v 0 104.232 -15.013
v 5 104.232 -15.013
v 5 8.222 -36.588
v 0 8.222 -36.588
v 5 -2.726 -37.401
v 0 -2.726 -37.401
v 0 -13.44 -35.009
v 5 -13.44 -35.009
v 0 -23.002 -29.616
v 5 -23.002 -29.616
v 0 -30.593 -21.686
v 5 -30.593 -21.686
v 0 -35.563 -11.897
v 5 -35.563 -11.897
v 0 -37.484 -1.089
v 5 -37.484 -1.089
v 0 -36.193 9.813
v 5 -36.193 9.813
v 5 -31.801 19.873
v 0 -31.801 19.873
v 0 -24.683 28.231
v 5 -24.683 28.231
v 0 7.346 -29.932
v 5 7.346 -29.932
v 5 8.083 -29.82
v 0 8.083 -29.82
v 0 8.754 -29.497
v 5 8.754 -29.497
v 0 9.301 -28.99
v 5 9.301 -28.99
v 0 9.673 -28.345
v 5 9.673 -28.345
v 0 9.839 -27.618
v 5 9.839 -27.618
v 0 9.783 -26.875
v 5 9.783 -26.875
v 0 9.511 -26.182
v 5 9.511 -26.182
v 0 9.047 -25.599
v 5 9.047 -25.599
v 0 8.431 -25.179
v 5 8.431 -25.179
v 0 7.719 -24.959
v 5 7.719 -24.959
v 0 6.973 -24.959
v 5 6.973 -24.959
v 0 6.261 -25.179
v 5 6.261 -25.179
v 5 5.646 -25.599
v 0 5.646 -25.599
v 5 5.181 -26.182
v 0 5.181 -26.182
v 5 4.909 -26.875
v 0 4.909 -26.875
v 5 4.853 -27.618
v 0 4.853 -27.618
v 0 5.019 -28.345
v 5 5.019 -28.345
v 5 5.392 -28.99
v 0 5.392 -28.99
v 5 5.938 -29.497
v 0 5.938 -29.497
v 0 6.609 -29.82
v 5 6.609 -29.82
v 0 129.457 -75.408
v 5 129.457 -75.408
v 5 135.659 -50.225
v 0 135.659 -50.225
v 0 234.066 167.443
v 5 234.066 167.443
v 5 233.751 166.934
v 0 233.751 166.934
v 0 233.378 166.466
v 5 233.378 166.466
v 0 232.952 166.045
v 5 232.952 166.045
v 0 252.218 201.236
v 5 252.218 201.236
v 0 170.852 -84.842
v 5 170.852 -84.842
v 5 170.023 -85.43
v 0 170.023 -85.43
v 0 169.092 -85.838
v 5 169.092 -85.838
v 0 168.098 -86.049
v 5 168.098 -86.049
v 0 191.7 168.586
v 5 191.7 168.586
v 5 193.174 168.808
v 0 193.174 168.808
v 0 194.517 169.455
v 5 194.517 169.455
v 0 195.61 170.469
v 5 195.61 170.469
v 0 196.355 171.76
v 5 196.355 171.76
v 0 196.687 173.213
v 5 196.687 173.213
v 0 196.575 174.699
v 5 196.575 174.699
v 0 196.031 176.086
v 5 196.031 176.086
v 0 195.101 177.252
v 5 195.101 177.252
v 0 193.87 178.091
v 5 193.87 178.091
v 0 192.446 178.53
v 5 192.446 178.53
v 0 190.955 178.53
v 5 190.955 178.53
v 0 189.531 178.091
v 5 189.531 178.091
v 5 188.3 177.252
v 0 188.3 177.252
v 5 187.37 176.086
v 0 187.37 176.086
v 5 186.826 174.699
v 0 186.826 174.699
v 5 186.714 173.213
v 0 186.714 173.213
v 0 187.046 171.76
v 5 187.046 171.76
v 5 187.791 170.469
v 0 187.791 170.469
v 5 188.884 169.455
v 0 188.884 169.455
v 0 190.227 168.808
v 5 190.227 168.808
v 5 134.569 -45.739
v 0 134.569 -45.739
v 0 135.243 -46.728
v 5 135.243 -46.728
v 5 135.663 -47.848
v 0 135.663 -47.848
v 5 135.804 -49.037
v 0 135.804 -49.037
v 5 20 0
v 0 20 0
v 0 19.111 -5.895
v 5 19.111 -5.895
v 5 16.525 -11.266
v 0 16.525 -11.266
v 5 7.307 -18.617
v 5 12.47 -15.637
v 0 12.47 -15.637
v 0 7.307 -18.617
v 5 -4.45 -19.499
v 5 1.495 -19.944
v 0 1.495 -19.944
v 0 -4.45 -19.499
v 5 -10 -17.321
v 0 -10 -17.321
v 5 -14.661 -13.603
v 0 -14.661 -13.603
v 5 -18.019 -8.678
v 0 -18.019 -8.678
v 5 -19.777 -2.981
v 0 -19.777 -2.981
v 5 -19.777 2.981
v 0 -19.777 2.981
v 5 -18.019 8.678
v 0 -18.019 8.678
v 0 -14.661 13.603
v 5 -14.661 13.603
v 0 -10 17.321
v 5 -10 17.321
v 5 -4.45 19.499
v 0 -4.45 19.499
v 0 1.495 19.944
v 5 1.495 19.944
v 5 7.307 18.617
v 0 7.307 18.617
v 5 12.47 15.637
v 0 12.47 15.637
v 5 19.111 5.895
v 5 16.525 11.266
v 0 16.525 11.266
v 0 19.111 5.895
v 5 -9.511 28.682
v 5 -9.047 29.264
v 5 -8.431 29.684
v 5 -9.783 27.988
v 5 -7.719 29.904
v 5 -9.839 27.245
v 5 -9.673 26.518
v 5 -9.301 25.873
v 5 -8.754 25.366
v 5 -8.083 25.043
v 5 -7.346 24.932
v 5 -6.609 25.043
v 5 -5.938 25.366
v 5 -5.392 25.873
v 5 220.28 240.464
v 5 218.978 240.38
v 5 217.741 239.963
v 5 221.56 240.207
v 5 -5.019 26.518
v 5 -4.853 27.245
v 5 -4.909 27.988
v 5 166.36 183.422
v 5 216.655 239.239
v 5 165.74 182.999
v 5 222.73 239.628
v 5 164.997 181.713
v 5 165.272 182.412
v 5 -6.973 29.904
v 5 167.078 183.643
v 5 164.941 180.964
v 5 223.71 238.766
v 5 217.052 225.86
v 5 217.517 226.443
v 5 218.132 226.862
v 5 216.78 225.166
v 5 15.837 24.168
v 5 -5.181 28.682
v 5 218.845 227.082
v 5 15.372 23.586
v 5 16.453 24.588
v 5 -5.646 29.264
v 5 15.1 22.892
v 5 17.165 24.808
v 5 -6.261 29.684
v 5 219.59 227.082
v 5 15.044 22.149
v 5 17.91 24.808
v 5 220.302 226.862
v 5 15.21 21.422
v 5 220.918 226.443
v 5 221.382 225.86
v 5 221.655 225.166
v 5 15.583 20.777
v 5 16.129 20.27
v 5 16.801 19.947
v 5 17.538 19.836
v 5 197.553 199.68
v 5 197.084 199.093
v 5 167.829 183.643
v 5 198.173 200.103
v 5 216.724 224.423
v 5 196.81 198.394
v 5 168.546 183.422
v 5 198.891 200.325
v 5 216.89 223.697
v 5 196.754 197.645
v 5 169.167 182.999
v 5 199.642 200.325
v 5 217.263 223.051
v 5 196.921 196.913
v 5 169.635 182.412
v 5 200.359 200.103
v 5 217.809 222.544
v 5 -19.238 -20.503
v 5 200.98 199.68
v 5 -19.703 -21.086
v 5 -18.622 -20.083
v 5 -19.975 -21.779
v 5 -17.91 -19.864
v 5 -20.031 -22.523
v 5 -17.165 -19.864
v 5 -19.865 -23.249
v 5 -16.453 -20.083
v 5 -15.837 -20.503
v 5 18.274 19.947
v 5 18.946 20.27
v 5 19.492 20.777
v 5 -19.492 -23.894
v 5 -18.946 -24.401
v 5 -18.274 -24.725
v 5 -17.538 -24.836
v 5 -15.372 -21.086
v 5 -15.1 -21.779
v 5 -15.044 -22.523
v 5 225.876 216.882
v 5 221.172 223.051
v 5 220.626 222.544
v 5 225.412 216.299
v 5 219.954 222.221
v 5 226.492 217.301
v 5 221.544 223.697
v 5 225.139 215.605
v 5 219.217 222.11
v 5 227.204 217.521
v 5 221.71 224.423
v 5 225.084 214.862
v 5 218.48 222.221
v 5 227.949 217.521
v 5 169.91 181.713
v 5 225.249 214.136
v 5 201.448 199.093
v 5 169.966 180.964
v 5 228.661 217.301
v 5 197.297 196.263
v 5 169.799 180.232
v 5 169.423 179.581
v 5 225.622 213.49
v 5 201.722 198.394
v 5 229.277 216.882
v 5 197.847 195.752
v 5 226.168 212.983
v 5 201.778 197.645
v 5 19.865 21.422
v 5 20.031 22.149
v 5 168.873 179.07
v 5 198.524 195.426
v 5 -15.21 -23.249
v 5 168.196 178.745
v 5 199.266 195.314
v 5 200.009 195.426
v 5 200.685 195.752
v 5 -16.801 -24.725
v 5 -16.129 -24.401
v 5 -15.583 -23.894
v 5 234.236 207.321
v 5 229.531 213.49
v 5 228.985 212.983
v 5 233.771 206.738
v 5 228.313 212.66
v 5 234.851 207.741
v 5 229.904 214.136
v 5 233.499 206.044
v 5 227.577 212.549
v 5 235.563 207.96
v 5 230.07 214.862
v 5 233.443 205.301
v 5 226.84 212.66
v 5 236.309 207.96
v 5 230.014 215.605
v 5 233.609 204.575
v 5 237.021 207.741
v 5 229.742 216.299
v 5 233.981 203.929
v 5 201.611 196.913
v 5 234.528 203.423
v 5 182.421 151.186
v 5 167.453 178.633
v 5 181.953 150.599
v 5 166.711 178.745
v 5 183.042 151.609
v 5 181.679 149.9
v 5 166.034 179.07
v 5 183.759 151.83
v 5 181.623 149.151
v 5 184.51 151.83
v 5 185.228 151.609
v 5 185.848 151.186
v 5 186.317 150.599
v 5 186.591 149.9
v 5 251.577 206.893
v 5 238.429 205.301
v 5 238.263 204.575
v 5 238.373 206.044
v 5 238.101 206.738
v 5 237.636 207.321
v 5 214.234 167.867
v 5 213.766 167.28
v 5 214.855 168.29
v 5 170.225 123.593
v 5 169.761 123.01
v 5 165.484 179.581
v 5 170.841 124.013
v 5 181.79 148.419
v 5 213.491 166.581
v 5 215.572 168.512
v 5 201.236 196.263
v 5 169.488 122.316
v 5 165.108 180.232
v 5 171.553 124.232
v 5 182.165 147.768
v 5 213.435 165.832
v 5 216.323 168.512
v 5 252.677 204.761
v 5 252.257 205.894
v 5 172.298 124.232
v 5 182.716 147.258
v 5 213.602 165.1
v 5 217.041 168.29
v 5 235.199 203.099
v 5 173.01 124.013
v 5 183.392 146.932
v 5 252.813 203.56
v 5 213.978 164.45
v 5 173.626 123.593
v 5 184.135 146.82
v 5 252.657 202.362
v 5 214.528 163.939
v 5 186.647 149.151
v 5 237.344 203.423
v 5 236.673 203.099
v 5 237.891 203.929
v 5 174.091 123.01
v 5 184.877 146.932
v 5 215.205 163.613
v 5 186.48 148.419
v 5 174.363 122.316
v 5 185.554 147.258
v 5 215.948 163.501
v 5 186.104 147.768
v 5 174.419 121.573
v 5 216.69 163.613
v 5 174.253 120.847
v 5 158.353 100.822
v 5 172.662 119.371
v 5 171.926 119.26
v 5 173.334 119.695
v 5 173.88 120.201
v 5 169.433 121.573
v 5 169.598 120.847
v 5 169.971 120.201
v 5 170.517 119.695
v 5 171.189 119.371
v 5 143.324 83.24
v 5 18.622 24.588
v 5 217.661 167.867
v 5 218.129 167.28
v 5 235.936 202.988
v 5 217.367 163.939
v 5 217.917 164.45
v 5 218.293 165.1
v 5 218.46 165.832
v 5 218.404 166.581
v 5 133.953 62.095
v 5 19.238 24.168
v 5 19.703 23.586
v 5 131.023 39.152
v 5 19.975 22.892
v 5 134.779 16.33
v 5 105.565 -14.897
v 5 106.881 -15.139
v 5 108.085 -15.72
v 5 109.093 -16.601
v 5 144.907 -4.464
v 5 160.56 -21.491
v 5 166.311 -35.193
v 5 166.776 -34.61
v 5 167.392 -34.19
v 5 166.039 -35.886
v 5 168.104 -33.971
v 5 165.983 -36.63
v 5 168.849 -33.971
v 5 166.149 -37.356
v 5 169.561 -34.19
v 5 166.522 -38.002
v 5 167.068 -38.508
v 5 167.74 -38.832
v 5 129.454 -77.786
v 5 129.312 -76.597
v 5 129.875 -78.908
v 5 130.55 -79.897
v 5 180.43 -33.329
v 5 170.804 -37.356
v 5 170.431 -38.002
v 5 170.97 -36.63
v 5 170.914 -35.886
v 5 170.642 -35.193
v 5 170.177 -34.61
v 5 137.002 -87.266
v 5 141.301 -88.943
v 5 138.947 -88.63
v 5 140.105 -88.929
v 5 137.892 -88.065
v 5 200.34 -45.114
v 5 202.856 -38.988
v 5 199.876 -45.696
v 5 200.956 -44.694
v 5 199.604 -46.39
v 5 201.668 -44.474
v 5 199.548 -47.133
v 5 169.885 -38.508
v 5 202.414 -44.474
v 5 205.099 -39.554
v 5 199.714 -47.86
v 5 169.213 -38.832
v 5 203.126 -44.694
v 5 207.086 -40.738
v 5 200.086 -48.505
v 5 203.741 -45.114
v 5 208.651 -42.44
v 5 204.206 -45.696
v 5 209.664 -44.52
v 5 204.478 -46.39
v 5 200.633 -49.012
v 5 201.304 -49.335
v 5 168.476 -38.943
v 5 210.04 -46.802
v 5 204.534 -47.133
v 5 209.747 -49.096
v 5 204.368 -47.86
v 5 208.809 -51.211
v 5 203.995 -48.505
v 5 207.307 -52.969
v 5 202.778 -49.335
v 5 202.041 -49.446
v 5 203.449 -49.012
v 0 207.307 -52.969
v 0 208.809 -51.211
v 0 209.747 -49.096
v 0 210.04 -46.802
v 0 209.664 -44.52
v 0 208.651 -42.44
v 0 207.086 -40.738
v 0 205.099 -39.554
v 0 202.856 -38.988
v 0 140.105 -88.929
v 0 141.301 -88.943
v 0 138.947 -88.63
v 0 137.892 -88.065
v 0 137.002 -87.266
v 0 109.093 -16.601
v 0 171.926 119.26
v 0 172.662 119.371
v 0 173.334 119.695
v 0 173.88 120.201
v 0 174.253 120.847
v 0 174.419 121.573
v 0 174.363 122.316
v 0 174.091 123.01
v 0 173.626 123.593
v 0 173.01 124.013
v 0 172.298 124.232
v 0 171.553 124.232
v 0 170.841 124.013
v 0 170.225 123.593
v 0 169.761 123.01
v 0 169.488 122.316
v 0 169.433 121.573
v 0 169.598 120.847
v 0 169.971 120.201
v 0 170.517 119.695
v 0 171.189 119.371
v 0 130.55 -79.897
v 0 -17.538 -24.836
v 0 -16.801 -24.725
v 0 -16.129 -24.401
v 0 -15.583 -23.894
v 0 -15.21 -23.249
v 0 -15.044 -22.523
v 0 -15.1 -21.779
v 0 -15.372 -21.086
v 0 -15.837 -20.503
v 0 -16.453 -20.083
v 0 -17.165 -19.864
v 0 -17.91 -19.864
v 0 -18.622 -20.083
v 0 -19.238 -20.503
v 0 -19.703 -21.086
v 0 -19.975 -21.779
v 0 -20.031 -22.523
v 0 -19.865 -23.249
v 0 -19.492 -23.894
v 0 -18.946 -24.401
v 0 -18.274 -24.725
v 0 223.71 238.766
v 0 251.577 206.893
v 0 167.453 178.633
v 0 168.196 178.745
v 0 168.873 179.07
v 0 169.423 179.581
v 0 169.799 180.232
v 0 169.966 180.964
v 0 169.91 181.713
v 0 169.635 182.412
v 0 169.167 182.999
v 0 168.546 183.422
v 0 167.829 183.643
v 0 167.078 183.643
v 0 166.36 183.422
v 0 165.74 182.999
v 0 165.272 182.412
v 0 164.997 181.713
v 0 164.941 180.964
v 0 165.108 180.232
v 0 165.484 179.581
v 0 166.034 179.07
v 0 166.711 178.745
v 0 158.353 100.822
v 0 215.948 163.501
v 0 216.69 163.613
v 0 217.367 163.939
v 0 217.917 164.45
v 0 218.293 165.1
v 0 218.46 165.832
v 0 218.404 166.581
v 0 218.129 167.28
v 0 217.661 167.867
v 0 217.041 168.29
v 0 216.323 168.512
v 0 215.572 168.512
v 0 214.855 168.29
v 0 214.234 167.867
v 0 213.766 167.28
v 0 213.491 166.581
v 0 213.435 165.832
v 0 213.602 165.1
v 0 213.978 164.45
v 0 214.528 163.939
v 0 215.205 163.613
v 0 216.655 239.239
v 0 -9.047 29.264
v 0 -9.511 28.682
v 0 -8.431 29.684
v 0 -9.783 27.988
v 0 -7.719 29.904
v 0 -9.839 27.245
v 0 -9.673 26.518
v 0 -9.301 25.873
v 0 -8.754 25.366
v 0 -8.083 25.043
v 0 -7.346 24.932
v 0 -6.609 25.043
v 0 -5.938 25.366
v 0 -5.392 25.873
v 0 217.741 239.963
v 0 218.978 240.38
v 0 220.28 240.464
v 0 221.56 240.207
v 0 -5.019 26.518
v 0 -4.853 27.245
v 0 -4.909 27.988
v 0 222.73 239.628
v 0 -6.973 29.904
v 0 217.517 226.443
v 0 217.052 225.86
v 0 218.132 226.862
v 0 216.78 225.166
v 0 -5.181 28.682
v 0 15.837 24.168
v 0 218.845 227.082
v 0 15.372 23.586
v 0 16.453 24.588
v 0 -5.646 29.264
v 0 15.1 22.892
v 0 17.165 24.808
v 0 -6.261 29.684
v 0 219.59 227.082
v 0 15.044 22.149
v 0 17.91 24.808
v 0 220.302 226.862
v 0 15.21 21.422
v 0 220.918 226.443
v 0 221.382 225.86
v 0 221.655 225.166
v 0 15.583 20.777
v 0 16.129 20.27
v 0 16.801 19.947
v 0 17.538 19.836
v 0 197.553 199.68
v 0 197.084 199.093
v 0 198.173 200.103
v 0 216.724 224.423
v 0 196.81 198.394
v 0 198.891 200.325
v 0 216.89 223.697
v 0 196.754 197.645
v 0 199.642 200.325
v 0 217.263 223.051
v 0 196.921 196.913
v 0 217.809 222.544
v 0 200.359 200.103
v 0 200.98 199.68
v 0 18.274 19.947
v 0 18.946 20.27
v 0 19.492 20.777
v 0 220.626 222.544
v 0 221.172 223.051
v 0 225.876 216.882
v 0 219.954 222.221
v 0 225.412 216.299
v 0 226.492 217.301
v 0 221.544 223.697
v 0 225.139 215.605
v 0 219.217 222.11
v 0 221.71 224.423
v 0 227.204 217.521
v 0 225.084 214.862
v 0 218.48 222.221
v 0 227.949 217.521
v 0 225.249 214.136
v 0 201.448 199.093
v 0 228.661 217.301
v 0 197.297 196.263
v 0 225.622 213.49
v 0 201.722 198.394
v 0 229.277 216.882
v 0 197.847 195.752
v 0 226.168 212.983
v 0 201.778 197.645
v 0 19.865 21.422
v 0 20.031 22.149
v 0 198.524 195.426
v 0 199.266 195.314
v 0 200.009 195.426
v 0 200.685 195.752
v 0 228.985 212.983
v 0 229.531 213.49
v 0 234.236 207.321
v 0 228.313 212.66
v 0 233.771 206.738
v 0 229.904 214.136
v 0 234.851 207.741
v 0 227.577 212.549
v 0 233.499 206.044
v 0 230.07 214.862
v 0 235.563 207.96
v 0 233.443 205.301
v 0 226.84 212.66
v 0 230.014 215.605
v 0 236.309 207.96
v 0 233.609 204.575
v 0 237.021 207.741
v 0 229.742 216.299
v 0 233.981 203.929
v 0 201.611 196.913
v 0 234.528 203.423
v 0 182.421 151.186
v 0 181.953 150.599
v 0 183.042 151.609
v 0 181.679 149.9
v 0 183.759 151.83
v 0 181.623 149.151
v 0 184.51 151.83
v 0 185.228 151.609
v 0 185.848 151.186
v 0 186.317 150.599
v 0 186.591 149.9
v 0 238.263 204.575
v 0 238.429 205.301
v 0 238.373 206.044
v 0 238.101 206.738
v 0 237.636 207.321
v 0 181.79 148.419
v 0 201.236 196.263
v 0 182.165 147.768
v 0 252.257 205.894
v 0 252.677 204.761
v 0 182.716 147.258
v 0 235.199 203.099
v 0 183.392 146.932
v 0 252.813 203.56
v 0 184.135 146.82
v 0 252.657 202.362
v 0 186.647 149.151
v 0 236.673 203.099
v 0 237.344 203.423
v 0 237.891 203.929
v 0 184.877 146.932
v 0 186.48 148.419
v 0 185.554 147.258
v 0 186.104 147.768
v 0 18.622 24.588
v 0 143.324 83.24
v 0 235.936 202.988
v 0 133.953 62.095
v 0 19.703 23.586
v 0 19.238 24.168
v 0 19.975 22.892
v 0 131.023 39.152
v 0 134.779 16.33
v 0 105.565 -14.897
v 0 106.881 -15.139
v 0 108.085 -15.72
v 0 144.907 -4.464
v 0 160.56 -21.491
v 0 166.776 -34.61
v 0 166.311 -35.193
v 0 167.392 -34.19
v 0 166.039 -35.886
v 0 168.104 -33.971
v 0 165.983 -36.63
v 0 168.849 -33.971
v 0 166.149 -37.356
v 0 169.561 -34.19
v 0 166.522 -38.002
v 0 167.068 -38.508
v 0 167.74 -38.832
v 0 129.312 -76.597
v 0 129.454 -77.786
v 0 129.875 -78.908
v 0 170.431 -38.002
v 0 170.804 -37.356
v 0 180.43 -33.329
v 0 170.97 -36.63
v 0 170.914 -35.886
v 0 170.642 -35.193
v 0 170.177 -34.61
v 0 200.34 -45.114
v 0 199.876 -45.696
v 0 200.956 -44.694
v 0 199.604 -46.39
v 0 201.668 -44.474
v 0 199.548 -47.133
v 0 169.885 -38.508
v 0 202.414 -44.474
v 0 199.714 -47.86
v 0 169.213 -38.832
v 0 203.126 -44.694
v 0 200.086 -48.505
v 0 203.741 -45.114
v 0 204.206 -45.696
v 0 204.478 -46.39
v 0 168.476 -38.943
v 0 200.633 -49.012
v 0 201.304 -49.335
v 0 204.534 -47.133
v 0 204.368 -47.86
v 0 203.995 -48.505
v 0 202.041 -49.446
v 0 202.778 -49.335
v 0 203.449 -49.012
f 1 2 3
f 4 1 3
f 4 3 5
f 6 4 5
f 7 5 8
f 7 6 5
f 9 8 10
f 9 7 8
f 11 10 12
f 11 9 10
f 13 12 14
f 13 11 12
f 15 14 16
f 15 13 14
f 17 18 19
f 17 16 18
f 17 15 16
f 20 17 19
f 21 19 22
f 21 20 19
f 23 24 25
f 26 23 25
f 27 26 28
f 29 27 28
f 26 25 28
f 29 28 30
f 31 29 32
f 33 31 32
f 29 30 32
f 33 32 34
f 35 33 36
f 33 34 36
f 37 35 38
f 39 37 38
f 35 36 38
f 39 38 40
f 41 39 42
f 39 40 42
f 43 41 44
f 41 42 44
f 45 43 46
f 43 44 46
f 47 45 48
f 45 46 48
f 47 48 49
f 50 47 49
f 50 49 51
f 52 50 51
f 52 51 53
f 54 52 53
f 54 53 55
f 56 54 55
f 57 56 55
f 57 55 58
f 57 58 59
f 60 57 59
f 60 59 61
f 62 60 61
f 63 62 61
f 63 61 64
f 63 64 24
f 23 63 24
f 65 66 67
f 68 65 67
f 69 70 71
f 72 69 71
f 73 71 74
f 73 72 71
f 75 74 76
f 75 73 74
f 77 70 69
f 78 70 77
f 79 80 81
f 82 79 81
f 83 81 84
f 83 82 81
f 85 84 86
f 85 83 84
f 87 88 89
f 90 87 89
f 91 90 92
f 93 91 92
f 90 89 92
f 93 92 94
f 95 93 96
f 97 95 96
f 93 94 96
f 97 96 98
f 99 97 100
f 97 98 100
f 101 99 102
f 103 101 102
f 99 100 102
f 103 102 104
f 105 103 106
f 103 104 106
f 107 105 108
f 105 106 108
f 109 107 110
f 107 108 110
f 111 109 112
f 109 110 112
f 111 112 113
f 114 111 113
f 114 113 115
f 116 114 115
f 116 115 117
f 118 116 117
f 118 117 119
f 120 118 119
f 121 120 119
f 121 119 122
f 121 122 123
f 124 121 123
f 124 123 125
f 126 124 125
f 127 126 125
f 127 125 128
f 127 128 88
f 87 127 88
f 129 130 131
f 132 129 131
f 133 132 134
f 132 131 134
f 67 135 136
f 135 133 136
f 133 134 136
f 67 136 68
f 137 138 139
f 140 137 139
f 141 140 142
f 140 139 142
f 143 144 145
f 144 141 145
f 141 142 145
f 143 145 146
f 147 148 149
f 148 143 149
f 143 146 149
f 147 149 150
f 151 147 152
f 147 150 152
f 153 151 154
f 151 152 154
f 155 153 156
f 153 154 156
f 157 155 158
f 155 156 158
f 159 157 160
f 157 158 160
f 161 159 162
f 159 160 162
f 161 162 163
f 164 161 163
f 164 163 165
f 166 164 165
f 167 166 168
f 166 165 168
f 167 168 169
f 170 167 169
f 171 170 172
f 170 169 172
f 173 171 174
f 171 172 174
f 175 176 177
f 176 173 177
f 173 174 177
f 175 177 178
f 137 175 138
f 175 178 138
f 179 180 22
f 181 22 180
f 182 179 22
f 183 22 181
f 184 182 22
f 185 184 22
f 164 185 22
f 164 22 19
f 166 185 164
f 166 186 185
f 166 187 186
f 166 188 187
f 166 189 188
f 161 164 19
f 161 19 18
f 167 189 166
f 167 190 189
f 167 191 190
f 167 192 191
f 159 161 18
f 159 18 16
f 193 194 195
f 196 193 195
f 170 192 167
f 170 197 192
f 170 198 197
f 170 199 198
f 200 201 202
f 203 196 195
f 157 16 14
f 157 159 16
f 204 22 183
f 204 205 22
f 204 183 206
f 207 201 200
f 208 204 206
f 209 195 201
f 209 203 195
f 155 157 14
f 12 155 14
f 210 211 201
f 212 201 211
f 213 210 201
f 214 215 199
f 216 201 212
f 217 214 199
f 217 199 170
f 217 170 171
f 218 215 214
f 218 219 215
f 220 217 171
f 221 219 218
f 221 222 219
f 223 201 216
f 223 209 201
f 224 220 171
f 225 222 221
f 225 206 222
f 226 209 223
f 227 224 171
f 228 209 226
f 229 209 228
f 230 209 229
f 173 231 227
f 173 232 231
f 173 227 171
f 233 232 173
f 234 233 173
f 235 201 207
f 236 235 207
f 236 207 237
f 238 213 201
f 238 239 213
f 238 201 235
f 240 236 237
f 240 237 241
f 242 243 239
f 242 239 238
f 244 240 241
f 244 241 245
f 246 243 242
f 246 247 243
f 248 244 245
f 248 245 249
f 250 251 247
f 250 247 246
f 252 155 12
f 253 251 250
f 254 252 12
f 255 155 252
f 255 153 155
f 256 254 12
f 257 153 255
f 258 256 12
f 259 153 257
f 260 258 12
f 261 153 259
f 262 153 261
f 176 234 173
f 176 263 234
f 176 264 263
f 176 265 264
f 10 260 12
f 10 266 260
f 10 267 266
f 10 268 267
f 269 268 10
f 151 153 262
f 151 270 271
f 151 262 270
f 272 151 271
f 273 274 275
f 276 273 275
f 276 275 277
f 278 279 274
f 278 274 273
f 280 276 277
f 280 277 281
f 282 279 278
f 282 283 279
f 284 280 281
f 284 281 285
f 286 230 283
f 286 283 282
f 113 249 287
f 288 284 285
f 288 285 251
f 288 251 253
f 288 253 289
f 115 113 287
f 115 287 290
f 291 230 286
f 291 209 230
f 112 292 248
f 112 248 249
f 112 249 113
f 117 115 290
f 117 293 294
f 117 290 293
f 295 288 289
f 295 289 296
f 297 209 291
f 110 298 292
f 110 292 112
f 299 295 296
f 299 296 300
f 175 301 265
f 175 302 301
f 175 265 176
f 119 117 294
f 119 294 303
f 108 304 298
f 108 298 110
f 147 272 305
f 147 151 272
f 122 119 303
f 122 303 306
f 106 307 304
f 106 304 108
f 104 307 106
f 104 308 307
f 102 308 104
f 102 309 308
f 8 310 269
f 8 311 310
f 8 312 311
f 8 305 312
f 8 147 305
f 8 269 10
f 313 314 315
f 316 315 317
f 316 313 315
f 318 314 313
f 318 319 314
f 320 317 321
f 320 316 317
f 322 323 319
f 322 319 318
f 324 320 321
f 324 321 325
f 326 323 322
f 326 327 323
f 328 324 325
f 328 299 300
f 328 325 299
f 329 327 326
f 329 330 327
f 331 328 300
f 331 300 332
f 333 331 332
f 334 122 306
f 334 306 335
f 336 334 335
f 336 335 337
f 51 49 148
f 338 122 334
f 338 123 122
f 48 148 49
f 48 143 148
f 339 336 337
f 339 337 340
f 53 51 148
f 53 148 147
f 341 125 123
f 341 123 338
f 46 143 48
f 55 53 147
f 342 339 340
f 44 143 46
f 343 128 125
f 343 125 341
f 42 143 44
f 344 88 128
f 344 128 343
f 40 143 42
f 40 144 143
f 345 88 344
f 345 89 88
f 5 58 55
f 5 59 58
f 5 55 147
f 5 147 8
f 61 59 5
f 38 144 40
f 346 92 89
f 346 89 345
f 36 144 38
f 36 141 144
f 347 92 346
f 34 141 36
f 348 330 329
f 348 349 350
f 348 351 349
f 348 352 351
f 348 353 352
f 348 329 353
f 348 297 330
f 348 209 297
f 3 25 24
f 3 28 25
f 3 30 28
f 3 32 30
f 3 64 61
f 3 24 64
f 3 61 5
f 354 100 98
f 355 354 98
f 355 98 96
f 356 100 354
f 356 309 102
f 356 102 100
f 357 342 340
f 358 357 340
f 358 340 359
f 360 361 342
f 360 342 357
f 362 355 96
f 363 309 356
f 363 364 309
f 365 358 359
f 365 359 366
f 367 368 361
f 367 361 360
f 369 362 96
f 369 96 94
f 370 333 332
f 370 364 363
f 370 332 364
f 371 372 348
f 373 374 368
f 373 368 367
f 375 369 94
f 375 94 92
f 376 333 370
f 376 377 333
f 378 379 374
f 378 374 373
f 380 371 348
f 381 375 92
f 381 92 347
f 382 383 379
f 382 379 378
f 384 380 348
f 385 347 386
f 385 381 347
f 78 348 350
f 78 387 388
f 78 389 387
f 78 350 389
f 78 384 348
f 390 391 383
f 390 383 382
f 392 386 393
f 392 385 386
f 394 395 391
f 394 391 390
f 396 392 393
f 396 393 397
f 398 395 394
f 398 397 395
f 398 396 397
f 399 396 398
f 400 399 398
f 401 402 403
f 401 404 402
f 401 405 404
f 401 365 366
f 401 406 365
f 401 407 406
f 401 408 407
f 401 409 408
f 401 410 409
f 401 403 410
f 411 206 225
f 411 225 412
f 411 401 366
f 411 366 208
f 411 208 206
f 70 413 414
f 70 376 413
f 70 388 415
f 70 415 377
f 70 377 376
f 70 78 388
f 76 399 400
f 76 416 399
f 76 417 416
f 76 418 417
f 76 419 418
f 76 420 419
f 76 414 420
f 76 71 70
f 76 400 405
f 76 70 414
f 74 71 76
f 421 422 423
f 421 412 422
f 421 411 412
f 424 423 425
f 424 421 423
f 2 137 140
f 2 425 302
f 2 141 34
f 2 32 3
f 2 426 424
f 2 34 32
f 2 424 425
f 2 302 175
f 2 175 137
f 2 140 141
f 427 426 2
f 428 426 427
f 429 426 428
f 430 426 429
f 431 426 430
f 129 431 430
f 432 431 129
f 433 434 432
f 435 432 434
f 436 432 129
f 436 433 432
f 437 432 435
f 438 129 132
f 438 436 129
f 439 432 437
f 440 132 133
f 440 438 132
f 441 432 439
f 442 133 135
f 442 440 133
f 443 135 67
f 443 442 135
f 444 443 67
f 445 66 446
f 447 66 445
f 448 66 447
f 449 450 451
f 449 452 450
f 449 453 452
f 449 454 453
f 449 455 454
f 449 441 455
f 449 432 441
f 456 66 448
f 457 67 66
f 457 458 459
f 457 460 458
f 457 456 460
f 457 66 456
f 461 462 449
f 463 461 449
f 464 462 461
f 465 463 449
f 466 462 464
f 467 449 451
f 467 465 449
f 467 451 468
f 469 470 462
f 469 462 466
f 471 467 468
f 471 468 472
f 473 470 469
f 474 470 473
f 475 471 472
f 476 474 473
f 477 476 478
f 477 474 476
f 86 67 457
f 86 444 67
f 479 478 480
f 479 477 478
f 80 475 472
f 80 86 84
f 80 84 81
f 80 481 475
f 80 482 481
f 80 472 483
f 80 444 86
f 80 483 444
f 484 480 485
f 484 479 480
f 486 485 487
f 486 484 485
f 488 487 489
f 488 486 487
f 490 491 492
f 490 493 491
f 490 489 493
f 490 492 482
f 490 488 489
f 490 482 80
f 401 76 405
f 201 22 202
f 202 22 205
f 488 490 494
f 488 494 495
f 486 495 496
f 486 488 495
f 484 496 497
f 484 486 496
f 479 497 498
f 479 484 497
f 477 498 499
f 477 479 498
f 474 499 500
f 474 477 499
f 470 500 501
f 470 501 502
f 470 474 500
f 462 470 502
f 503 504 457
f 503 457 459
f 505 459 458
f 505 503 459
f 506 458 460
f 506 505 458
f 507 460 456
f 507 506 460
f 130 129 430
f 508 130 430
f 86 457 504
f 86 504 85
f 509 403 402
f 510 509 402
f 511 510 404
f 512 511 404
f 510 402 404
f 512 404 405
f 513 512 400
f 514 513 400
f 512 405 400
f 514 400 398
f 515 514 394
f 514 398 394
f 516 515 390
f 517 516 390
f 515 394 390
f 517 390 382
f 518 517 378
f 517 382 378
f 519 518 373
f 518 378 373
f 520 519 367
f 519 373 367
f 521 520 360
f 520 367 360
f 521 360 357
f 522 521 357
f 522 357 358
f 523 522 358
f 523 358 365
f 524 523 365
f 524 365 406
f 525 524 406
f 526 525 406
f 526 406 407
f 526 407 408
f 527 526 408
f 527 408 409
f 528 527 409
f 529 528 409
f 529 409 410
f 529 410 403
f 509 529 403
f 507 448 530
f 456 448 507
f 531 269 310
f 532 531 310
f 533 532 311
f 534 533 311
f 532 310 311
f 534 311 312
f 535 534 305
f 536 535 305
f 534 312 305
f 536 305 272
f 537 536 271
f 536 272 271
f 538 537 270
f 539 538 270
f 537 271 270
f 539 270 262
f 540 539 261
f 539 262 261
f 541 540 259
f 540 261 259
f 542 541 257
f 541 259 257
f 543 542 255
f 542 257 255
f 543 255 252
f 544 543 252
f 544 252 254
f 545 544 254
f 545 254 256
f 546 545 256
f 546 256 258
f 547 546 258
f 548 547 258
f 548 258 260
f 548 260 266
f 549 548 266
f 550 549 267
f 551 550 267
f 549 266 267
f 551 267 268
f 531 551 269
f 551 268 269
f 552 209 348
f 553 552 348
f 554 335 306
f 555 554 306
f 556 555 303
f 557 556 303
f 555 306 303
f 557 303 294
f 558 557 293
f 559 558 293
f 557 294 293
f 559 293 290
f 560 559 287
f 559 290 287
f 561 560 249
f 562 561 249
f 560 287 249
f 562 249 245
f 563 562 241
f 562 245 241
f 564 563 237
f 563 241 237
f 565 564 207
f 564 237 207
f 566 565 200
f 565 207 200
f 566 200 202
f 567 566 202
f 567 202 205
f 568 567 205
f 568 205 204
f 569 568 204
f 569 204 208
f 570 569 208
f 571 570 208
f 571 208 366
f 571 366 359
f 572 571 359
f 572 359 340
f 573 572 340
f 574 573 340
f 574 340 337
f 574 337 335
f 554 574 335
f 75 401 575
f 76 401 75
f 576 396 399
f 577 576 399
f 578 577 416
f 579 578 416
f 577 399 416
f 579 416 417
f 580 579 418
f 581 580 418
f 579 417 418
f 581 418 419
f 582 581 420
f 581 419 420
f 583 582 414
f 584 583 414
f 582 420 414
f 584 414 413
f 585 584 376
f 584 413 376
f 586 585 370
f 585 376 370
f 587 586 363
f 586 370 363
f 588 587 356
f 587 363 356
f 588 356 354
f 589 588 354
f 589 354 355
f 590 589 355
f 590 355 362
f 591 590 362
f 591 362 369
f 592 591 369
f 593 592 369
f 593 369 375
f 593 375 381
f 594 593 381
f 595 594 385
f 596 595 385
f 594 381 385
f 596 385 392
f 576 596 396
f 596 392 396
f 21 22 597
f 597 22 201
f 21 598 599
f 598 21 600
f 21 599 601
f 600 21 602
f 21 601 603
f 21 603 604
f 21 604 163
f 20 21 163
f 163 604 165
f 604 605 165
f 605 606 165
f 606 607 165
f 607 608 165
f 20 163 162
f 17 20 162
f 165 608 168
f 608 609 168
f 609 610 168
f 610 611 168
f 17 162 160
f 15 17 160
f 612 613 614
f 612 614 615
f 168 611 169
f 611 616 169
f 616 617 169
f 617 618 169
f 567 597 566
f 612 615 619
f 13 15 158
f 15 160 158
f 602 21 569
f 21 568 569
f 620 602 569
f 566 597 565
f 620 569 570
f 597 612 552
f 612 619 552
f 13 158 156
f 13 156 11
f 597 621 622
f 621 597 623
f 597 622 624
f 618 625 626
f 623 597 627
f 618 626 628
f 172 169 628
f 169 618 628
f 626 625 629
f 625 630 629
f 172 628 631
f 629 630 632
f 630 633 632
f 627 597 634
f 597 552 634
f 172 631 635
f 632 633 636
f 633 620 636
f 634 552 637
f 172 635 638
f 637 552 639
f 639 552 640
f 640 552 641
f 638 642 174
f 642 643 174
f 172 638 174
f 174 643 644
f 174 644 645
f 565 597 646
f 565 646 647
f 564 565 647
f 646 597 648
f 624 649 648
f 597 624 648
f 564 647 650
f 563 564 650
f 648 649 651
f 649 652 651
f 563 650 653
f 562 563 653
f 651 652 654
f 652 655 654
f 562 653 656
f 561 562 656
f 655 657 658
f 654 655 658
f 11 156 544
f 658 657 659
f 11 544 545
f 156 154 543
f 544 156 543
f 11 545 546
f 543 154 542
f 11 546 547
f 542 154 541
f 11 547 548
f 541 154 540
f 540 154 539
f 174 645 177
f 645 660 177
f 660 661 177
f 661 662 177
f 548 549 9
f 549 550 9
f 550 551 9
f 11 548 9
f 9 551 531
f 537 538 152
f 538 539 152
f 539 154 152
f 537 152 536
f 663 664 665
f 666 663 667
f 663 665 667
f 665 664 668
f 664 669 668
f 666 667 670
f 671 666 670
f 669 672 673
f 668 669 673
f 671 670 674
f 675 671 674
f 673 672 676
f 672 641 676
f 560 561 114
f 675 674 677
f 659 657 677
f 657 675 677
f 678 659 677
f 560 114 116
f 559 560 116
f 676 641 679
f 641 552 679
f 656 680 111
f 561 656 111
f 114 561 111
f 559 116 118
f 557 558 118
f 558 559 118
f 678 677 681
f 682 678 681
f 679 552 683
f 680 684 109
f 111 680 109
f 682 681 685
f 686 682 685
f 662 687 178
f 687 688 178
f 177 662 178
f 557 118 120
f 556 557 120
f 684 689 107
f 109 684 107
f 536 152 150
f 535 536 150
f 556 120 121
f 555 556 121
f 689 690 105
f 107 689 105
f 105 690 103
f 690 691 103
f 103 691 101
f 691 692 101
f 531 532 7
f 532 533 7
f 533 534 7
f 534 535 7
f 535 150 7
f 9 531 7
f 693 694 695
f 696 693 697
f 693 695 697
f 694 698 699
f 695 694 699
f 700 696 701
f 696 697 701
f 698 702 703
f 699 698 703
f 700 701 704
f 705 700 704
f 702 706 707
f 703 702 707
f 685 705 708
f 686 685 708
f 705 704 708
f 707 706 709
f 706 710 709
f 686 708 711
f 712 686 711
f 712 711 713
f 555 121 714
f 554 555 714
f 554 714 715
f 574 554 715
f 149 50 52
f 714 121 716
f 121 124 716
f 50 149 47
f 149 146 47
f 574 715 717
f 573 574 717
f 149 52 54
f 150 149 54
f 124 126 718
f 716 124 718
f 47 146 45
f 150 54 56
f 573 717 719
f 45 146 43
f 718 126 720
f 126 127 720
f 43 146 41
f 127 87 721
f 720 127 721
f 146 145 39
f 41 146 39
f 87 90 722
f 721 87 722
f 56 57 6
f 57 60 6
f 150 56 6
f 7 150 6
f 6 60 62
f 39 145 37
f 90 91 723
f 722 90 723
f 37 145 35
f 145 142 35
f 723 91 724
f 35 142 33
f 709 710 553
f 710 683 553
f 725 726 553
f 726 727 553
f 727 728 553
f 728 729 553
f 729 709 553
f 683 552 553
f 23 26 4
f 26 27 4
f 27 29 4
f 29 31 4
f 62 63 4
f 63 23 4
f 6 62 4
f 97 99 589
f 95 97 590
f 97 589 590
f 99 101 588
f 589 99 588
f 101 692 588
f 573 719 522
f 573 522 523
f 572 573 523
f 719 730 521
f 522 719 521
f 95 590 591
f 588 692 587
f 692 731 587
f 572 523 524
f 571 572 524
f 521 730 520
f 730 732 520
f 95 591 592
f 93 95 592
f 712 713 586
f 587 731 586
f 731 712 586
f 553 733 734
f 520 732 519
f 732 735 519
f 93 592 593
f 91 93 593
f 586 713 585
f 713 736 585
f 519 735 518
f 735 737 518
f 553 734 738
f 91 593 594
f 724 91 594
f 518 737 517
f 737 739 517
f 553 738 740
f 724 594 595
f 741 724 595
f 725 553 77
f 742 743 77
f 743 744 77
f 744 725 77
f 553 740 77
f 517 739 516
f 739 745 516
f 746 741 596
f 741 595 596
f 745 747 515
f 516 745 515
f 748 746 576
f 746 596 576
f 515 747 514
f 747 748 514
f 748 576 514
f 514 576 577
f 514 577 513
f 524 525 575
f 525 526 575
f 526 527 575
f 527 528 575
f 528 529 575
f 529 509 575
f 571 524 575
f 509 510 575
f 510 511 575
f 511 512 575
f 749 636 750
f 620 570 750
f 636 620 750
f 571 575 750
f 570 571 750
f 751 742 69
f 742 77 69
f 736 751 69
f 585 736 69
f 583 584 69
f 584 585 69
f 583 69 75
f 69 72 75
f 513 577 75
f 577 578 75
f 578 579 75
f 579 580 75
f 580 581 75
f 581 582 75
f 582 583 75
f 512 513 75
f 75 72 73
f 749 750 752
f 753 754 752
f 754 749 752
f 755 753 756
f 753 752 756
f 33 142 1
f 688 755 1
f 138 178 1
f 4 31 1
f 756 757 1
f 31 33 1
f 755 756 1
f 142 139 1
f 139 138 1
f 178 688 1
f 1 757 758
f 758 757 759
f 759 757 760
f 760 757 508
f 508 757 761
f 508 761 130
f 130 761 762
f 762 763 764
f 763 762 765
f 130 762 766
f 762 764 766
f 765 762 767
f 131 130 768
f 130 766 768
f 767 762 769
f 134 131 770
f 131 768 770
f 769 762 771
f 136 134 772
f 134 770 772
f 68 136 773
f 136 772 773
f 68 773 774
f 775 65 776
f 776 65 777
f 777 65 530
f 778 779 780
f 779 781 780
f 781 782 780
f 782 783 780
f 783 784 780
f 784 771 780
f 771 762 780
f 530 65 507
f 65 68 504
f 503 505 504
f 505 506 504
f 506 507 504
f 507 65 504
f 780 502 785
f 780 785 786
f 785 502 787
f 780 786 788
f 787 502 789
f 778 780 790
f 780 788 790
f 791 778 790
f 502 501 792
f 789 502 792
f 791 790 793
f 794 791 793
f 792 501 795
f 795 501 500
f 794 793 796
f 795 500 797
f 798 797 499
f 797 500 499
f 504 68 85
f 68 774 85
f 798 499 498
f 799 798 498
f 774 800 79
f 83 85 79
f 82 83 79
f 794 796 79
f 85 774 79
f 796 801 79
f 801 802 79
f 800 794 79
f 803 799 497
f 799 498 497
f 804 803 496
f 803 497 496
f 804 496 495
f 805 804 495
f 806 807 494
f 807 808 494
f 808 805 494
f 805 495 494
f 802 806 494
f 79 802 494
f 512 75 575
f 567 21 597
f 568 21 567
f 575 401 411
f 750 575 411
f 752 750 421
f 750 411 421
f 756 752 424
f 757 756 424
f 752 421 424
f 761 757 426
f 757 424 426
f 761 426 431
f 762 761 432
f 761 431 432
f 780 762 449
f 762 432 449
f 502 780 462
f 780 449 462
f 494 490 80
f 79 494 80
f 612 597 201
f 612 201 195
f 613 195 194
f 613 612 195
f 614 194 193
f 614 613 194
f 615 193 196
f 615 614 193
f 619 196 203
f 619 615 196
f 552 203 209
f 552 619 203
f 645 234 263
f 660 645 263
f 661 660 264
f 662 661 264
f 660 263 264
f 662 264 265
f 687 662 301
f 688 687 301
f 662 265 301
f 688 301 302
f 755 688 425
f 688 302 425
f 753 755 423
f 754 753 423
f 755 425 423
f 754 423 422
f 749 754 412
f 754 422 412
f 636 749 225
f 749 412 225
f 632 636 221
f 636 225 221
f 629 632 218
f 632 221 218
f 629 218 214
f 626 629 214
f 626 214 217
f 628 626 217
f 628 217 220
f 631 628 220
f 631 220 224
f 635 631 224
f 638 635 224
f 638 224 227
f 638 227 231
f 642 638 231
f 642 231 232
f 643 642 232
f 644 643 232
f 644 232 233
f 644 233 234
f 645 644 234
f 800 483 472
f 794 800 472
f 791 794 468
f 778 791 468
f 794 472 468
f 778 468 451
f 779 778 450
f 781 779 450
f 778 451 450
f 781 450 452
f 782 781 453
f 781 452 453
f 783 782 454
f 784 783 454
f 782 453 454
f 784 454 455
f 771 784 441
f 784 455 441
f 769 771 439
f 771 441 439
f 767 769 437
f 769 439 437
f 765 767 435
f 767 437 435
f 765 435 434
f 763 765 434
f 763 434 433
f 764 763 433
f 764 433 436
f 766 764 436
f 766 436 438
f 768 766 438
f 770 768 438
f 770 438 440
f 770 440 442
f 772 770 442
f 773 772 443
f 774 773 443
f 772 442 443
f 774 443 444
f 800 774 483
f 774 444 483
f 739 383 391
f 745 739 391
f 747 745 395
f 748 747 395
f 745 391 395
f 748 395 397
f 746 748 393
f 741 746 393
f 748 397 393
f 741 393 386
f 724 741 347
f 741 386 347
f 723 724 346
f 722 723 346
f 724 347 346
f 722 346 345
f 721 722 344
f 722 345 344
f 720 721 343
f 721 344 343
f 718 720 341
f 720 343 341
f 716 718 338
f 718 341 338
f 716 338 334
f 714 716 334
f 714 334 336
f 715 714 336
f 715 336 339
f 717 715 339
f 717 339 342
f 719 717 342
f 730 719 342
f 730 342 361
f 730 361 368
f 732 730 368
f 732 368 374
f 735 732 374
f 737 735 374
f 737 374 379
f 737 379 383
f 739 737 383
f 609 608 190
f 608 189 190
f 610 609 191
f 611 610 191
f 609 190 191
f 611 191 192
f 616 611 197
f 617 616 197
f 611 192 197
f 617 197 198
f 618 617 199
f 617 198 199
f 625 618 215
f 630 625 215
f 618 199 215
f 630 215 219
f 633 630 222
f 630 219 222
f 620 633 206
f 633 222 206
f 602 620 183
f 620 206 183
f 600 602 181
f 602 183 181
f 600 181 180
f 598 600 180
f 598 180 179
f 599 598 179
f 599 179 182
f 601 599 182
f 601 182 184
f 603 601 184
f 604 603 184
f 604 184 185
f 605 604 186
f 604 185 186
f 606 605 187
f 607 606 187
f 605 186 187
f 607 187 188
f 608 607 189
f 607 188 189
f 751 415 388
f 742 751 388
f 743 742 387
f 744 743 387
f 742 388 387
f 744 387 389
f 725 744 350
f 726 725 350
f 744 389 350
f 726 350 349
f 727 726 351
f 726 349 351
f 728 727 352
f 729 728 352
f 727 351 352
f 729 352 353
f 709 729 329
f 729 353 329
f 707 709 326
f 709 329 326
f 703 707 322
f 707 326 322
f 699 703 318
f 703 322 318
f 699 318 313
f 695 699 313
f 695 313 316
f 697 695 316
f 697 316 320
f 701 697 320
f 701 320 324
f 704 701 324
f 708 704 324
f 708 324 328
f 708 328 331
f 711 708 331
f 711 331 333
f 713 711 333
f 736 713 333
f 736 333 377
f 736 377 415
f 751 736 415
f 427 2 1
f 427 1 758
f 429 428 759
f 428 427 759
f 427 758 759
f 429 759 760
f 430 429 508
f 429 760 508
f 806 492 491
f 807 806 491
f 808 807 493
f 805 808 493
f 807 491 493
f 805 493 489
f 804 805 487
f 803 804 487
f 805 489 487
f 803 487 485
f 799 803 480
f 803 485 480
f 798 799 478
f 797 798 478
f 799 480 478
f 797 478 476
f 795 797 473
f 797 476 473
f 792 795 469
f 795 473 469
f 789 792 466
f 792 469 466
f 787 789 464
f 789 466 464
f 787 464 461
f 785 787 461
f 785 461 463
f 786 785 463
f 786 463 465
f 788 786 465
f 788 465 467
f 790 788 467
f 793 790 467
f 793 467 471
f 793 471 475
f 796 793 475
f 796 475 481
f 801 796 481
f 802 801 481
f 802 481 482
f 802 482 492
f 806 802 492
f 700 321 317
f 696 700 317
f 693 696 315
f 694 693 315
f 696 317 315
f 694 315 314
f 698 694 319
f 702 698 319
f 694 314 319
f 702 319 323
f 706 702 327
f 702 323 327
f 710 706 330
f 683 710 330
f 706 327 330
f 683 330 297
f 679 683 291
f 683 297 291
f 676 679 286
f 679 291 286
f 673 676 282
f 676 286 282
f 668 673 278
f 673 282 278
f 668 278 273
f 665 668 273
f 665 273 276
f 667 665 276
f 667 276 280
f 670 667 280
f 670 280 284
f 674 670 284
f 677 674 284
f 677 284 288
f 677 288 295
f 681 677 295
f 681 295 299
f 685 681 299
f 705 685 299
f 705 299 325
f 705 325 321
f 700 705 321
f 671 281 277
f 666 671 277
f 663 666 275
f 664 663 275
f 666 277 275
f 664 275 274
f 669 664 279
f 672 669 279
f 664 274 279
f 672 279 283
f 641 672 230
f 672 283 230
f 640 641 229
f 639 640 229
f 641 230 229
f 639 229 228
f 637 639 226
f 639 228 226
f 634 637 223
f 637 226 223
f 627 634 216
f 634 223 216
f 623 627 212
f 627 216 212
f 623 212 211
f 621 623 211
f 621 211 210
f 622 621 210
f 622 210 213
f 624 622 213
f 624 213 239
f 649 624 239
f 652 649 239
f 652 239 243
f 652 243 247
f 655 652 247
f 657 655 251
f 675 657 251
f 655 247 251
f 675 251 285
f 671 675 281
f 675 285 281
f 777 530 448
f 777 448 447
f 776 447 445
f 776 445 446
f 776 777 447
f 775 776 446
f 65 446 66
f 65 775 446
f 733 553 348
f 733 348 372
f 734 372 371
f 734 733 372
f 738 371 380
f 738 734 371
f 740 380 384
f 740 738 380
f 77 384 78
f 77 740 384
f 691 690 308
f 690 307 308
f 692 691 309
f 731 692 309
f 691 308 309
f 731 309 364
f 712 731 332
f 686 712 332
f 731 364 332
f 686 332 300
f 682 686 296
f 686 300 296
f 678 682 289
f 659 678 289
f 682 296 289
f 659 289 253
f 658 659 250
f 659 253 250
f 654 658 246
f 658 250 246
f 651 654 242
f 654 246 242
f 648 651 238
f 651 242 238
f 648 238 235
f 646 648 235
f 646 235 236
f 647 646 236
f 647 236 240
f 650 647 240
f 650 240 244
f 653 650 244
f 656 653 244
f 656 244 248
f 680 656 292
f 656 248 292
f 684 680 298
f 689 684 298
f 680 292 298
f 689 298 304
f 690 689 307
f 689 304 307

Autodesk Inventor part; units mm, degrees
ref_plane "YZ Plane" through (0, 0, 0) normal (1, 0, 0) x (0, 1, 0)
ref_plane "XZ Plane" through (0, 0, 0) normal (0, 1, 0) x (-1, 0, 0)
ref_plane "XY Plane" through (0, 0, 0) normal (0, 0, 1) x (1, 0, 0)
sketch "Esboço1" plane through (0, 0, 0) normal (1, 0, 0) x (0, 1, 0)
  circle A0 centre (0, 0) radius 20
  circle A1 centre (0, 0) radius 37.5
  dimension "d0" = 40
  dimension "d1" = 75
extrude "Extrusão1" add sketch "Esboço1" along normal blind 5
sketch "Esboço3" plane through (5, 0, 0) normal (1, 0, 0) x (0, 0, -1)
  line L0 (154.1962, 109.7603) -> (153.014, 111.1125) projected
  line L1 (40.5387, 95.9825) -> (78.7824, 129.4199) projected
  line L2 (153.014, 111.1125) -> (-99.3237, 399.7205)
  circle A0 centre (0, 0) radius 37.5 projected
  line L3 (-28.231, -24.6832) -> (-242.5302, 220.4188)
  arc A1 (-100.8216, 158.3529) -> (38.988, 202.8563) centre (-40.5953, 211.0103) ccw
  line L4 (-100.8216, 158.3529) -> (-166.6433, 233.6357)
  line L5 (-166.6433, 233.6357) -> (-204.2865, 253.8562)
  circle A2 centre (46.9464, 202.0409) radius 2.5
  circle A3 centre (36.4428, 168.4765) radius 2.5
  arc A4 (52.969, 207.3066) -> (38.988, 202.8563) centre (46.9464, 202.0409) ccw
  line L6 (52.969, 207.3066) -> (85.8799, 169.6652)
  line L7 (85.8799, 169.6652) -> (14.3612, 107.1346)
  line L8 (14.3612, 107.1346) -> (36.5877, 8.2215)
  circle A5 centre (-224.6099, 219.2172) radius 2.5
  circle A6 centre (-205.4881, 235.936) radius 2.5
  circle A7 centre (-215.049, 227.5766) radius 2.5
  line L9 (-242.5302, 220.4188) -> (-204.2865, 253.8562)
  dimension "d5" = 160
  dimension "d10" = 100
  dimension "d11" = 5
  dimension "d12" = 5
  dimension "d13" = 88
  dimension "d14" = 88
  dimension "d15" = 20
  dimension "d16" = 50
  dimension "d18" = 50
  dimension "d19" = 95
  dimension "d20" = 5
  dimension "d21" = 5
  dimension "d22" = 5
  dimension "d23" = 12.7
  dimension "d25" = 12.7
  dimension "d30" = 280
  dimension "d31" = 140
  dimension "d32" = 12.7
  dimension "d33" = 12.7
  dimension "d34" = 12.7
  dimension "d35" = 12.7
extrude "Extrusão2" add sketch "Esboço3" against normal blind 5 contours A0 L3 L9 L5 L4 A1 A4 L6 L7 L8
sketch "Esboço4" plane through (5, 0, 0) normal (1, 0, 0) x (0, 0, -1)
  line L0 (154.1962, 109.7603) -> (153.014, 111.1125) projected
  line L1 (153.014, 111.1125) -> (-112.9577, 415.3142)
  circle A0 centre (-34.8401, 212.0241) radius 75
  circle A1 centre (-121.7601, 171.9256) radius 20
  line L2 (-204.2865, 253.8562) -> (-242.5302, 220.4188) projected
  line L3 (-242.5302, 220.4188) -> (-28.231, -24.6832) projected
  circle A2 centre (-121.7601, 171.9256) radius 2.5
  circle A3 centre (-173.5863, 191.7005) radius 5
  circle A4 centre (-22.3357, 17.5375) radius 2.5 projected
  circle A5 centre (-27.4315, -7.3461) radius 2.5 projected
  circle A6 centre (22.3357, -17.5375) radius 2.5 projected
  circle A7 centre (27.4315, 7.3461) radius 2.5 projected
  point P0 (0, 0)
  dimension "d38" = 150
  dimension "d39" = 40
  dimension "d40" = 116
  dimension "d41" = 59
  dimension "d42" = 5
  dimension "d43" = 10
  dimension "d45" = 33
  dimension "d46" = 67
extrude "Extrusão3" cut sketch "Esboço4" against normal blind 5 contours A2 | A3 | A4 | A5 | A6 | A7
sketch "Esboço5" plane through (5, 0, 0) normal (1, 0, 0) x (0, 0, -1)
  circle A0 centre (-166.0206, 215.9476) radius 2.5193 construction
  circle A1 centre (-197.8334, 199.2662) radius 2.5193
  circle A2 centre (-149.3392, 184.1348) radius 2.5193
  circle A3 centre (-166.0206, 215.9476) radius 2.5193
  circle A4 centre (-181.152, 167.4534) radius 2.5193
  point P0 (0, 0)
extrude "Extrusão4" cut sketch "Esboço5" against normal blind 10
sketch "Esboço6" plane through (5, 0, 0) normal (1, 0, 0) x (0, 0, -1)
  line L0 (78.9782, 129.7261) -> (84.3768, 134.4529)
  line L1 (85.8799, 169.6652) -> (14.3612, 107.1346) projected
  line L2 (89.2225, 138.7154) -> (85.8799, 169.6652)
  line L3 (77.937, 128.8343) -> (47.698, 136.2818)
  line L4 (77.937, 128.8343) -> (89.2225, 138.7154)
  point P0 (0, 0)
  dimension "d58" = 55
  dimension "d61" = 15
  dimension "d62" = 25.5
  dimension "d64" = 55
extrude "Extrusão5" add sketch "Esboço6" against normal blind 5
fillet "Arredondamento1" radius 5 8 edges at (2.5, 107.1346, -14.3612) (2.5, 136.2818, -47.698) (2.5, 128.8343, -77.937) (2.5, 138.7154, -89.2225) (2.5, 169.6652, -85.8799) (2.5, 233.6357, 166.6433) (2.5, 253.8562, 204.2865) (2.5, 220.4188, 242.5302)
equation "\"d25\" = d23"
equation "\"d64\" = d58"
properties part number "CHAPA LATERAL INTAKE V2"
